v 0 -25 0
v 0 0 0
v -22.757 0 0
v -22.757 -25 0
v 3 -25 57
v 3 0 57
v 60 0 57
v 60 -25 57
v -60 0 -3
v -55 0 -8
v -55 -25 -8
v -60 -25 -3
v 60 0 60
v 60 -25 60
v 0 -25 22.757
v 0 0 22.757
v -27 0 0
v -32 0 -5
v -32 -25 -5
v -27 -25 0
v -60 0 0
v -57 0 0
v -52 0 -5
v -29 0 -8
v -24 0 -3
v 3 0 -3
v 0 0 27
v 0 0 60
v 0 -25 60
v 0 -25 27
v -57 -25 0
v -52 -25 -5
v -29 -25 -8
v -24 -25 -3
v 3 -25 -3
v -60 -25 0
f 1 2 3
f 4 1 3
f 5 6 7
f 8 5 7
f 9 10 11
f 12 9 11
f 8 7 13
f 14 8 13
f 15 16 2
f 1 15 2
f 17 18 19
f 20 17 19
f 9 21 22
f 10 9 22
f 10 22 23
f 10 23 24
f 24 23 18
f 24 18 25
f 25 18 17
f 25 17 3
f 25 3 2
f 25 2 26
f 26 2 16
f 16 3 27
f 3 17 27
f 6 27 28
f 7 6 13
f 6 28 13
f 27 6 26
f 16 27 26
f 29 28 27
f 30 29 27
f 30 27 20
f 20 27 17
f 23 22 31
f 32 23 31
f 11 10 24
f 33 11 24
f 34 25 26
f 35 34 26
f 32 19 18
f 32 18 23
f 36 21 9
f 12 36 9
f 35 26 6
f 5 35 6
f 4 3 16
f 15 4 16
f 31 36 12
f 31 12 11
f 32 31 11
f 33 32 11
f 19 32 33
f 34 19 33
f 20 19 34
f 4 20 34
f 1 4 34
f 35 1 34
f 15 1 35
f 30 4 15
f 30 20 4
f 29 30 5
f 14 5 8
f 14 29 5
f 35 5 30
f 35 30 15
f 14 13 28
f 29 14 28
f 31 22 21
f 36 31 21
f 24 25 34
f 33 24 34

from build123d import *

# Parameters (mm, degrees)
F1_DEPTH = 25
F2_SIZE  = 4.99999


# Not quite as in the source:
# - a fillet or chamfer is up to 0.001 mm smaller than in the source, because OpenCascade refuses the exact size


with BuildPart() as f1:
    # F0 (on Front) → F1 (new body)
    with BuildSketch(Plane.XZ):
        Polygon((0, 22.7573593129), (0, 0), (-22.7573593129, 0), (-27, 0), (-32, 0), (-32, -5), (-57, -5), (-57, 0), (-60, 0), (-60, -8), (-29, -8), (-29, -3), (0, -3), (3, -3), (3, 57), (60, 57), (60, 60), (0, 60), (0, 27), align=None)
        Polygon((-22.7573593129, 0), (0, 22.7573593129), (0, 27), (-27, 0), align=None)
    extrude(amount=F1_DEPTH)

    # F2 (size 5 in the source; OpenCascade refuses exactly that, so slightly less here)
    f2_edges = [f1.edges().sort_by_distance(p)[0] for p in [
        (-57, -12.5, -5),
        (-60, -12.5, -8),
        (-29, -12.5, -3),
        (-32, -12.5, 0),
    ]]
    chamfer(f2_edges, length=F2_SIZE)


solid = f1.part
